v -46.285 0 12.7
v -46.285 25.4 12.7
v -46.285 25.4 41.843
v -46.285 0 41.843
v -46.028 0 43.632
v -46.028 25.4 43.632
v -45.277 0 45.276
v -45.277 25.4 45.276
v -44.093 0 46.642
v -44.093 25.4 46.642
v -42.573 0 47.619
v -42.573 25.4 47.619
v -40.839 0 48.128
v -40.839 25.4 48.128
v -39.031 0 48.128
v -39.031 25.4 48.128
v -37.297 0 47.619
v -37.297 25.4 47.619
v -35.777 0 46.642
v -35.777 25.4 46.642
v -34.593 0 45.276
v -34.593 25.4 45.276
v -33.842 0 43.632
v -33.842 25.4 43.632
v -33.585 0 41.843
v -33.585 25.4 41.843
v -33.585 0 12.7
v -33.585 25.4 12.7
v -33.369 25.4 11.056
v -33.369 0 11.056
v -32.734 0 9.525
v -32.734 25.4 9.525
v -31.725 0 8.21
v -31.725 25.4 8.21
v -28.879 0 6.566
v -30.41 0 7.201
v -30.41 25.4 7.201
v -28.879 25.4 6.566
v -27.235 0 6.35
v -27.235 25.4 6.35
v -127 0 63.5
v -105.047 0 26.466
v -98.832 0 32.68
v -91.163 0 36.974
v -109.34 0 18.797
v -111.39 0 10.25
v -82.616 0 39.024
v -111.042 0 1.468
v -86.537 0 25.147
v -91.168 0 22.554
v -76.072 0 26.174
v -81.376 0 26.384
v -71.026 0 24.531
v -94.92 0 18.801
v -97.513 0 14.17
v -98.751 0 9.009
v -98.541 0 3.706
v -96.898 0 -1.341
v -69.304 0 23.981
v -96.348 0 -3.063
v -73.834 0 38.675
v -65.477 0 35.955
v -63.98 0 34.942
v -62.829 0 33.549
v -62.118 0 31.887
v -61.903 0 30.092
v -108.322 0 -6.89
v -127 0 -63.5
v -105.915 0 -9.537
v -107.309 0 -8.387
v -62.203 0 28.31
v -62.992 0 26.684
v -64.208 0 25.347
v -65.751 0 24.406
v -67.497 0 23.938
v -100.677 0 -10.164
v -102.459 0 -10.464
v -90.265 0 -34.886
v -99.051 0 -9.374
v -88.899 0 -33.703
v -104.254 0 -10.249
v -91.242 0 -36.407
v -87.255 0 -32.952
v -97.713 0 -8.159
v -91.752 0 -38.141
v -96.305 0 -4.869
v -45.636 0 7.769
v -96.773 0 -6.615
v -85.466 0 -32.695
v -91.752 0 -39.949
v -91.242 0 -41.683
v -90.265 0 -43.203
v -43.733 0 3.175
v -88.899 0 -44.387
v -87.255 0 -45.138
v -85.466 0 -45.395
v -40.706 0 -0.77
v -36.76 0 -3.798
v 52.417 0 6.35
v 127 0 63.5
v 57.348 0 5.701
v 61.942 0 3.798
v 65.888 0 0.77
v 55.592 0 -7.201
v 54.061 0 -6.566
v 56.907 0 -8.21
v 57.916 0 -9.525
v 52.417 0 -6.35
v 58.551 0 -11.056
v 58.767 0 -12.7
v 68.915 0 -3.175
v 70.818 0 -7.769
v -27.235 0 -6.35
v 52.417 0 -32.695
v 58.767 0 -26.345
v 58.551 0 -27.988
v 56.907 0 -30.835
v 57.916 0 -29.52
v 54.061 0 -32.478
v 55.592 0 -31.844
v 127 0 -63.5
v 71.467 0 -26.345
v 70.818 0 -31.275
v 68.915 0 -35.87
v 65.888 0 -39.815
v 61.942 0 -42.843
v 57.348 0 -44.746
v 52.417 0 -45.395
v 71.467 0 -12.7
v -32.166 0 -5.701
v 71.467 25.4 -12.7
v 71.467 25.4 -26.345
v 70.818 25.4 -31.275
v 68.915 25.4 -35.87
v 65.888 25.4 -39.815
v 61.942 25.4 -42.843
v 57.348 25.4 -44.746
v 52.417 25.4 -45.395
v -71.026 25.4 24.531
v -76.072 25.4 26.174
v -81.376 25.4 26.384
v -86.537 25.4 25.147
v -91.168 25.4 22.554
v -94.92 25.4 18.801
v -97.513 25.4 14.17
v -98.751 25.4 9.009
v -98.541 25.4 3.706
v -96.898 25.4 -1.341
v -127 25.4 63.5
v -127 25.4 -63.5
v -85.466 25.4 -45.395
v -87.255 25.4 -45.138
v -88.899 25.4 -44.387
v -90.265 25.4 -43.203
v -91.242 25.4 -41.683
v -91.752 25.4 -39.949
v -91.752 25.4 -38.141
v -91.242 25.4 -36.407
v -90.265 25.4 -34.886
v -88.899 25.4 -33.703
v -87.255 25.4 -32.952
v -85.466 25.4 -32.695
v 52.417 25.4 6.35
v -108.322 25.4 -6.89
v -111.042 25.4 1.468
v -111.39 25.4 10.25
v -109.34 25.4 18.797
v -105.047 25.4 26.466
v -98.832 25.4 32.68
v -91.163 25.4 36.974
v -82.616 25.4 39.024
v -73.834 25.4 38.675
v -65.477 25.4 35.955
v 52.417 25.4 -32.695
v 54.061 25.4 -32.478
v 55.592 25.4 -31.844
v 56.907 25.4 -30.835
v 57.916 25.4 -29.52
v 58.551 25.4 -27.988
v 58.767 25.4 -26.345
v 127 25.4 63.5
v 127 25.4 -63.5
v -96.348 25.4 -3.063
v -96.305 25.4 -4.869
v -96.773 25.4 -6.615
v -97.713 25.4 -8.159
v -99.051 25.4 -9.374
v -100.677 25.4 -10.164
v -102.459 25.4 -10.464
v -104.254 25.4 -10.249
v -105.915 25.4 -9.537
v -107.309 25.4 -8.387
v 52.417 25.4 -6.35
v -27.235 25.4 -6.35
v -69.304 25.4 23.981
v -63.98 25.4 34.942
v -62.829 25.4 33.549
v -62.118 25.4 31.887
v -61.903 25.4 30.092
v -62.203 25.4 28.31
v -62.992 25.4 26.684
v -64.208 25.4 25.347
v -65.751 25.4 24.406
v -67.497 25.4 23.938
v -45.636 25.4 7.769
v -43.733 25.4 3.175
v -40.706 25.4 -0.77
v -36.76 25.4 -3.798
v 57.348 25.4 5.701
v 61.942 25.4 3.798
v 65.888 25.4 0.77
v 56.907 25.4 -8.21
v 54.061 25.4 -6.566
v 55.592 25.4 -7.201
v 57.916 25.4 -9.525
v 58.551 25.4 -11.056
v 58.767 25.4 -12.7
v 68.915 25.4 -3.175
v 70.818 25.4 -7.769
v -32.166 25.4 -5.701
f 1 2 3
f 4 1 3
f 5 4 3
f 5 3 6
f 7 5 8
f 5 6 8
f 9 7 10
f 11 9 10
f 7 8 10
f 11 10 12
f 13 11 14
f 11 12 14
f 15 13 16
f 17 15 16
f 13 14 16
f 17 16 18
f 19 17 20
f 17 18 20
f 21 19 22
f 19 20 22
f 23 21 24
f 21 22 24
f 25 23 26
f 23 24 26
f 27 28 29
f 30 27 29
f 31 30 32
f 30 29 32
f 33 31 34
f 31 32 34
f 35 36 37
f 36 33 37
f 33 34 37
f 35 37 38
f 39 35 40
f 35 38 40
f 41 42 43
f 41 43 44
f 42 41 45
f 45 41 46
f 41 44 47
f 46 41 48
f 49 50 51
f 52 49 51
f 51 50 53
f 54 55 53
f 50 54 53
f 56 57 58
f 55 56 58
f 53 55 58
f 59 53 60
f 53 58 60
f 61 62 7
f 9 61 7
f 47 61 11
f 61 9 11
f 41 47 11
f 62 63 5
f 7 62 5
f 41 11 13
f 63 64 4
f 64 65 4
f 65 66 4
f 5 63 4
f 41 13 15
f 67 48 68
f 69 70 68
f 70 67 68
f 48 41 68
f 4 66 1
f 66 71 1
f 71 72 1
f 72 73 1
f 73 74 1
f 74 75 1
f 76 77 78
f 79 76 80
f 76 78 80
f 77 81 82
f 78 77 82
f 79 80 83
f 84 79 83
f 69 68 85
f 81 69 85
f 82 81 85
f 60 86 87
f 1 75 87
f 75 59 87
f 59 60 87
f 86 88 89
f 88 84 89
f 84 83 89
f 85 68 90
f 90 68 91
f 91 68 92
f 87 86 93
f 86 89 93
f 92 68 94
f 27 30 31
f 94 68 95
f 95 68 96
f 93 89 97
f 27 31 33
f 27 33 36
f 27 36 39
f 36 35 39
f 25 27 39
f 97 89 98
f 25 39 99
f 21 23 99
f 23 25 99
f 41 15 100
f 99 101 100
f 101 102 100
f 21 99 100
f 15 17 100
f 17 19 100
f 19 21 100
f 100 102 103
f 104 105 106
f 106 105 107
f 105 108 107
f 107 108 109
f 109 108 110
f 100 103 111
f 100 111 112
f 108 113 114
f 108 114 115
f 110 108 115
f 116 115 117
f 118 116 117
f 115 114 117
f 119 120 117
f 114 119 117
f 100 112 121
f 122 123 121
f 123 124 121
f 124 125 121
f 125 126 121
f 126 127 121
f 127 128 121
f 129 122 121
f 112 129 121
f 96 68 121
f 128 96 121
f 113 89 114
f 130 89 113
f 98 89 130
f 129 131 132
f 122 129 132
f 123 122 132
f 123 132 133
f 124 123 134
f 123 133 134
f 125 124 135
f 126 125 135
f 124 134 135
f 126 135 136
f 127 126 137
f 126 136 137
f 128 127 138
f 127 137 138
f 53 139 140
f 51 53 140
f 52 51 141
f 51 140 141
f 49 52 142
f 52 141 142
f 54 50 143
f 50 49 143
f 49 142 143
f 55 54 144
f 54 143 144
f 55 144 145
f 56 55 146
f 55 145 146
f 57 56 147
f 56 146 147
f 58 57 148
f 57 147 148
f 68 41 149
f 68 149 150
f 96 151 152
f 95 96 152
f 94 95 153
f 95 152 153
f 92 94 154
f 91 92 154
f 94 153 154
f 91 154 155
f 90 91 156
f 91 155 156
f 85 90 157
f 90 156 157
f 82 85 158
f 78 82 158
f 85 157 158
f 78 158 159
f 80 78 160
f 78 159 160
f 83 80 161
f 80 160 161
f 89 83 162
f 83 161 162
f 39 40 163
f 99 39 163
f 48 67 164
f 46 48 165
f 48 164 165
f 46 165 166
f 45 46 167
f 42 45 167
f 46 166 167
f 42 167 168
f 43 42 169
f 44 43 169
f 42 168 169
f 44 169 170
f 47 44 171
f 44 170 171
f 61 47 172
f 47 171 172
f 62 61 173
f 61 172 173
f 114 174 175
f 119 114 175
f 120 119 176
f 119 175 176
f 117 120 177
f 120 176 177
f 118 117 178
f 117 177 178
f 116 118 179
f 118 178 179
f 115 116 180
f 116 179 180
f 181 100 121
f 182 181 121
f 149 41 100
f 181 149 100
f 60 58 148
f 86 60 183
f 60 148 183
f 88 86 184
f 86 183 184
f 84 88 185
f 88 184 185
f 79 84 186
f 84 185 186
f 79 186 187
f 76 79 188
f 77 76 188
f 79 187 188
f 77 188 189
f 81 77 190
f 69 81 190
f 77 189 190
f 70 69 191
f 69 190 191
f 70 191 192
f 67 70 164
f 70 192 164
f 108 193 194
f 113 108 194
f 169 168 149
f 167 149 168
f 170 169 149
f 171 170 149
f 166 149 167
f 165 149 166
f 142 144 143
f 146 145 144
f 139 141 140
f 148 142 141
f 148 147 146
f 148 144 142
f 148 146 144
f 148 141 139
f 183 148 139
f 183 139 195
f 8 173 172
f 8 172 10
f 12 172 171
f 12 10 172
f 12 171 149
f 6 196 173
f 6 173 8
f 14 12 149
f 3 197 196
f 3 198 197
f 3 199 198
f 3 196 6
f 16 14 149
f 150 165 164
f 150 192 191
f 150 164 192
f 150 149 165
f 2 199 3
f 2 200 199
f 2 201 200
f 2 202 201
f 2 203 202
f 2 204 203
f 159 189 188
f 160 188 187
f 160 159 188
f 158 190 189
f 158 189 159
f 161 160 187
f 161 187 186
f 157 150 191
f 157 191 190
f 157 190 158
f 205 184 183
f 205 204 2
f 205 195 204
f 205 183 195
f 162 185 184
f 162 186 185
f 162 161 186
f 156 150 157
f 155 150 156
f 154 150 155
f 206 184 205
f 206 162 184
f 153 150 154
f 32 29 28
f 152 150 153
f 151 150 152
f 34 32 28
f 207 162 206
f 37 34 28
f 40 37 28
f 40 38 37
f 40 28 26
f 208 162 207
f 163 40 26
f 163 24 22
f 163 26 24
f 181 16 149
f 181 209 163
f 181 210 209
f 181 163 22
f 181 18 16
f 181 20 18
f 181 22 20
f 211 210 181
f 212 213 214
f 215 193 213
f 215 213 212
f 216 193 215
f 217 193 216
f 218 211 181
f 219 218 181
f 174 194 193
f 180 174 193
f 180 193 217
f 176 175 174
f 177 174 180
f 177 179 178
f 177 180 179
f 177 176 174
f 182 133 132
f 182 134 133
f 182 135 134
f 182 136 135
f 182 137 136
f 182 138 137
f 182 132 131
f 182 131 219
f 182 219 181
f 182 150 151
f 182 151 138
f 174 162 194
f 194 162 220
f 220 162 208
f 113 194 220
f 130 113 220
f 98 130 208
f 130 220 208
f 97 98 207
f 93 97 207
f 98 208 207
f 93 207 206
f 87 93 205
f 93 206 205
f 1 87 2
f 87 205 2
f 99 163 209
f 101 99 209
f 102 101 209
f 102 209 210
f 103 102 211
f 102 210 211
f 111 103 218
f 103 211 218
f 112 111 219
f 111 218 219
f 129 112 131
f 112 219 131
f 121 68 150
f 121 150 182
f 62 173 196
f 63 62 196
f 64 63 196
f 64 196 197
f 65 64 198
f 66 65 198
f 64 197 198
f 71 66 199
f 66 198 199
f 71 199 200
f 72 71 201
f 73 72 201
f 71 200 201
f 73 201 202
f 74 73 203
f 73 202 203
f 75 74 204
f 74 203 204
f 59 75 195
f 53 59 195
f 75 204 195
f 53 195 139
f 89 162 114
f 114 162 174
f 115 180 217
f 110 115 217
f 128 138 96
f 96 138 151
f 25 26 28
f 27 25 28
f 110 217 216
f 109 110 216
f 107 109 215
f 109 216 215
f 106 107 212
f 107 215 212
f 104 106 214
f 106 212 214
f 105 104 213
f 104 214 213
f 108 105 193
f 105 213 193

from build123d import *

# Parameters (mm, degrees)
SKETCH1_W           = 254
SKETCH1_H           = 127
BOSS_EXTRUDE1_DEPTH = 25.4
CUT_EXTRUDE2_DEPTH  = 145.244271983
CUT_EXTRUDE3_DEPTH  = 145.244271983


with BuildPart() as part:
    # Sketch1 → Boss-Extrude1 (new body)
    with BuildSketch(Plane(origin=(0, 0, 0), x_dir=(1, 0, 0), z_dir=(0, 1, 0))):
        Rectangle(SKETCH1_W, SKETCH1_H)
    extrude(amount=BOSS_EXTRUDE1_DEPTH)

    # Sketch3 → Cut-Extrude2 (cut, through all)
    with BuildSketch(Plane(origin=(0, 25.4, 0), x_dir=(1, 0, 0), z_dir=(0, 1, 0))):
        with BuildLine():
            Line((-85.466243436, 32.694846332), (52.417137856, 32.694846332))
            ThreePointArc((52.417137856, 32.694846332), (56.907265917, 30.834974392), (58.767137856, 26.344846332))
            Line((58.767137856, 26.344846332), (58.767137856, 12.7))
            ThreePointArc((58.767137856, 12.7), (56.907265917, 8.209871939), (52.417137856, 6.35))
            Line((52.417137856, 6.35), (-27.235119701, 6.35))
            ThreePointArc((-27.235119701, 6.35), (-40.705503883, 0.770384182), (-46.285119701, -12.7))
            Line((-46.285119701, -12.7), (-46.285119701, -41.842848349))
            ThreePointArc((-46.285119701, -41.842848349), (-39.935119701, -48.192848349), (-33.585119701, -41.842848349))
            Line((-33.585119701, -41.842848349), (-33.585119701, -12.7))
            ThreePointArc((-33.585119701, -12.7), (-31.725247761, -8.209871939), (-27.235119701, -6.35))
            Line((-27.235119701, -6.35), (52.417137856, -6.35))
            ThreePointArc((52.417137856, -6.35), (65.887522038, -0.770384182), (71.467137856, 12.7))
            Line((71.467137856, 12.7), (71.467137856, 26.344846332))
            ThreePointArc((71.467137856, 26.344846332), (65.887522038, 39.815230513), (52.417137856, 45.394846332))
            Line((52.417137856, 45.394846332), (-85.466243436, 45.394846332))
            ThreePointArc((-85.466243436, 45.394846332), (-91.816243436, 39.044846332), (-85.466243436, 32.694846332))
        make_face()
    extrude(amount=-CUT_EXTRUDE2_DEPTH, mode=Mode.SUBTRACT)

    # Sketch4 → Cut-Extrude3 (cut, through all)
    with BuildSketch(Plane(origin=(0, 25.4, 0), x_dir=(1, 0, 0), z_dir=(0, 1, 0))):
        with BuildLine():
            ThreePointArc((-108.321717666, 6.889728777), (-102.153470481, -29.786963762), (-65.476777942, -35.955210947))
            ThreePointArc((-65.476777942, -35.955210947), (-62.539282648, -27.468979663), (-71.025513931, -24.531484369))
            ThreePointArc((-71.025513931, -24.531484369), (-93.17321436, -20.806707641), (-96.897991088, 1.340992788))
            ThreePointArc((-96.897991088, 1.340992788), (-99.835486382, 9.827224072), (-108.321717666, 6.889728777))
        make_face()
    extrude(amount=-CUT_EXTRUDE3_DEPTH, mode=Mode.SUBTRACT)


solid = part.part
